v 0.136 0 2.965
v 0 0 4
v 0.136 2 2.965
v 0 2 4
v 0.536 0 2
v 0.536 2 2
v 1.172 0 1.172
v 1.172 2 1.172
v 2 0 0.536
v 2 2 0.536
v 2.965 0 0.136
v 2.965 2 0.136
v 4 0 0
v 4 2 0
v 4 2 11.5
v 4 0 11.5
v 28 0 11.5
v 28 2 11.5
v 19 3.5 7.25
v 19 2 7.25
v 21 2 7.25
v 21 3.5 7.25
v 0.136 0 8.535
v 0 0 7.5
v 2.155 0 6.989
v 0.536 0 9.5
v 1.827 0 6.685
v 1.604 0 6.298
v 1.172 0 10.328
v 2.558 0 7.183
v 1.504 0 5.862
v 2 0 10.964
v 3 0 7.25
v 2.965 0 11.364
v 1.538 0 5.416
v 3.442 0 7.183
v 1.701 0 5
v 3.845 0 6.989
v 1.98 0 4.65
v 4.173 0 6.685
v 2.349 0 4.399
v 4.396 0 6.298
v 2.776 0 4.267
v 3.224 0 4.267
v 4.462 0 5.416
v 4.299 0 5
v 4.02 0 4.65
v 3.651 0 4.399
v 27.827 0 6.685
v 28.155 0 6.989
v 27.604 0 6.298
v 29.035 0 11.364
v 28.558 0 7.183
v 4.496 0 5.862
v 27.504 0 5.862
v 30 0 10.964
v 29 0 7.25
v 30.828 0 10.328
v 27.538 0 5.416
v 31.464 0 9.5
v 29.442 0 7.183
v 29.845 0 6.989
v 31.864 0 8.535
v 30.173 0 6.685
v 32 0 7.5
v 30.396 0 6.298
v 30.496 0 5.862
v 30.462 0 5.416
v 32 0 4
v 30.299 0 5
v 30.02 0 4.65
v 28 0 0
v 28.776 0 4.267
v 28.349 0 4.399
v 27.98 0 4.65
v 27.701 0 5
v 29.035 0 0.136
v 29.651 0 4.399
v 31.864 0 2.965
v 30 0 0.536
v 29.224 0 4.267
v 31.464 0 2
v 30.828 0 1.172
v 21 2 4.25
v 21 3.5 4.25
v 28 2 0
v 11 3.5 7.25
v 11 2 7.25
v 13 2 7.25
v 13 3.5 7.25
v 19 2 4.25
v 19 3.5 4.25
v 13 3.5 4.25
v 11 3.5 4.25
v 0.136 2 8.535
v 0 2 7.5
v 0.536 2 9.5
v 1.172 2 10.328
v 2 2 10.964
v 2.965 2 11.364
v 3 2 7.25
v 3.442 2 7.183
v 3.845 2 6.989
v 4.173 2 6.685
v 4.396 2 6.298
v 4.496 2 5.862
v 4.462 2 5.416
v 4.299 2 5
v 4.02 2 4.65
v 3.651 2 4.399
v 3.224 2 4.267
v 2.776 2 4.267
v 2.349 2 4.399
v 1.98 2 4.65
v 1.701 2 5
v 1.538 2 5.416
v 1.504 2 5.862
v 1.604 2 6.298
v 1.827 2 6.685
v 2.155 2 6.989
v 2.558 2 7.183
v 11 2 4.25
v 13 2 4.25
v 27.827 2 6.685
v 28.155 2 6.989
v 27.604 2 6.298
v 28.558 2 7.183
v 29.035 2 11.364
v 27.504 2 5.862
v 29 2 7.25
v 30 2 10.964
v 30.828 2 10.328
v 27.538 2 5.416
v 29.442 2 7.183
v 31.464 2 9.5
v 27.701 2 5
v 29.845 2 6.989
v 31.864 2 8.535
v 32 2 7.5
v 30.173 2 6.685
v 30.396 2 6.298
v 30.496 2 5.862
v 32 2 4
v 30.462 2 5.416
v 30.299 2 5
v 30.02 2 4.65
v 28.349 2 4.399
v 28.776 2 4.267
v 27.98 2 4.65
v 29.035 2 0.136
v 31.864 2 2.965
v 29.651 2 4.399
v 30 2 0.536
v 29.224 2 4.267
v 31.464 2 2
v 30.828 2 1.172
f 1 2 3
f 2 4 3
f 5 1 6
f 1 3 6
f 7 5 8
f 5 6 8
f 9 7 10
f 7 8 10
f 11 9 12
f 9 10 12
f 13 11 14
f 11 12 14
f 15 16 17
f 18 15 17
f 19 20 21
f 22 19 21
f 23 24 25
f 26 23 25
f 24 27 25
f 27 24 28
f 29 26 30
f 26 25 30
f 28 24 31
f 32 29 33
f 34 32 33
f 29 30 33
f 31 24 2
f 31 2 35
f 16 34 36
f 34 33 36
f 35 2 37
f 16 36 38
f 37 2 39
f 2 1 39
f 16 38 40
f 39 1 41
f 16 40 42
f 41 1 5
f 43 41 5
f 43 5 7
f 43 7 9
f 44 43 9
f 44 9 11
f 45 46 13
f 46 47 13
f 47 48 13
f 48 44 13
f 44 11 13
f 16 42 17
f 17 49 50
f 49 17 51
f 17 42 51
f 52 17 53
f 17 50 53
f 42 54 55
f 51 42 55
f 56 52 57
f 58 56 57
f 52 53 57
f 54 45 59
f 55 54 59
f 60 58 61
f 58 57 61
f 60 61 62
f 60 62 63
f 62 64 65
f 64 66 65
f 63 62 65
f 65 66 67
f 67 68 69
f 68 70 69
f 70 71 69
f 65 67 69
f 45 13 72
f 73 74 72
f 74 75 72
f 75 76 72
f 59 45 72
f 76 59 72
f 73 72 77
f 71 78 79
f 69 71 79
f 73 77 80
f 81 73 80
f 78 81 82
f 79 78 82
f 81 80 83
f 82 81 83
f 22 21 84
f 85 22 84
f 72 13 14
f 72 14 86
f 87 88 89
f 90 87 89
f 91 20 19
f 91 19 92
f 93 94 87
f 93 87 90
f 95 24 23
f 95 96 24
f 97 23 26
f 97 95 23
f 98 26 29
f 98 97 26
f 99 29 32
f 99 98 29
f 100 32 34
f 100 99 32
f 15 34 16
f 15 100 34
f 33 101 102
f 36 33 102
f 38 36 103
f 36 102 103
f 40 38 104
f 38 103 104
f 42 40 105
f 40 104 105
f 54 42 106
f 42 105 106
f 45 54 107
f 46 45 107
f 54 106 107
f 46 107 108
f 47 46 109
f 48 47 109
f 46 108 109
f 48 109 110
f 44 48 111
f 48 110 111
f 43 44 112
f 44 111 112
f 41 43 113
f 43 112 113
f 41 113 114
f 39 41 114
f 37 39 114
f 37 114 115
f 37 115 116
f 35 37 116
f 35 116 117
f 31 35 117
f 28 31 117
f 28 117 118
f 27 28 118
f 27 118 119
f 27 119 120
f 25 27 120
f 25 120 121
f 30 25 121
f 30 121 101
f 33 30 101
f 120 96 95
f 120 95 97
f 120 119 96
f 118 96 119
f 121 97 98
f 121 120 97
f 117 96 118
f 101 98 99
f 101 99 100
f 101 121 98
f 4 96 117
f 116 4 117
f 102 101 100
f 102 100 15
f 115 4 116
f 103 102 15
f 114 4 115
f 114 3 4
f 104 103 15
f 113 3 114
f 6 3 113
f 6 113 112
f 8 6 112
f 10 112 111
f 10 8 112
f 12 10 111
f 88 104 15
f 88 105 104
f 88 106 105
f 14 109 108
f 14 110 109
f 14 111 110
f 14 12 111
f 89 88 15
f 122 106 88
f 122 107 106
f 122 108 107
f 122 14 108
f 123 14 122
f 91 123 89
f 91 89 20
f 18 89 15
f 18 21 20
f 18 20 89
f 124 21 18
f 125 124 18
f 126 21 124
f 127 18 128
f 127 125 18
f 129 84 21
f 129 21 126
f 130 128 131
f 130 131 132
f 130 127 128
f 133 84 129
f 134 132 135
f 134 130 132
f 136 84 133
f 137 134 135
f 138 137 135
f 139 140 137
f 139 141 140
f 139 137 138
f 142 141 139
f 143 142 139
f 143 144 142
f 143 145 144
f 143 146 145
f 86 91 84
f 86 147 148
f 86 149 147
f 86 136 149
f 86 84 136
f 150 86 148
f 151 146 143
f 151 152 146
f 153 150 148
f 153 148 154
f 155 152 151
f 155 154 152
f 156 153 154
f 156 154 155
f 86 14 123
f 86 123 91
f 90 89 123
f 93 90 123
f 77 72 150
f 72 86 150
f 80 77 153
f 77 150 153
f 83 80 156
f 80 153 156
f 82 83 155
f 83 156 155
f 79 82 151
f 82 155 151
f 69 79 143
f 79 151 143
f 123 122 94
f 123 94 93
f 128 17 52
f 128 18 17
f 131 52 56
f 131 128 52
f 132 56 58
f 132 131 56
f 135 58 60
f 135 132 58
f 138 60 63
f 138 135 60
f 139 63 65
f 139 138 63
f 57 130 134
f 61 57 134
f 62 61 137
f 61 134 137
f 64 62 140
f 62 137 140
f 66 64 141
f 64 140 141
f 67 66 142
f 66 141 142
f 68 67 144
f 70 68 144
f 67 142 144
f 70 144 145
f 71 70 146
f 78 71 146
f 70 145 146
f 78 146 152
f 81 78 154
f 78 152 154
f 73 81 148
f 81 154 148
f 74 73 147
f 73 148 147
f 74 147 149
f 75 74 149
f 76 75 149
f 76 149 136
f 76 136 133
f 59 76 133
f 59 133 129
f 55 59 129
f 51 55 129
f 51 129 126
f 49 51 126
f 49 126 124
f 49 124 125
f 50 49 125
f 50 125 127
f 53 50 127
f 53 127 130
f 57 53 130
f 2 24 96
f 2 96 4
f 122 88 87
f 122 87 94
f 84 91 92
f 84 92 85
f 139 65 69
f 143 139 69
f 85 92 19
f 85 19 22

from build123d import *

# Parameters (mm, degrees)
SKETCH1_W           = 32
SKETCH1_H           = 11.5
BOSS_EXTRUDE1_DEPTH = 2
SKETCH2_R           = 1.5
CUT_EXTRUDE1_DEPTH  = 35.062442661
FILLET1_R           = 4
SKETCH3_W           = 2
SKETCH3_H           = 3
BOSS_EXTRUDE2_DEPTH = 1.5


with BuildPart() as part:
    # Sketch1 → Boss-Extrude1 (new body)
    with BuildSketch(Plane(origin=(0, 0, 0), x_dir=(1, 0, 0), z_dir=(0, 1, 0))):
        with Locations((16, -5.75)):
            Rectangle(SKETCH1_W, SKETCH1_H)
    extrude(amount=BOSS_EXTRUDE1_DEPTH)

    # Sketch2 → Cut-Extrude1 (cut, through all)
    with BuildSketch(Plane(origin=(0, 2, 0), x_dir=(1, 0, 0), z_dir=(0, 1, 0))):
        with Locations(Location((3, -5.75, 0), (0, 0, 270))):
            Circle(SKETCH2_R)
        with Locations(Location((29, -5.75, 0), (0, 0, 270))):
            Circle(SKETCH2_R)
    extrude(amount=-CUT_EXTRUDE1_DEPTH, mode=Mode.SUBTRACT)

    # Fillet1
    fillet1_edges = [part.edges().sort_by_distance(p)[0] for p in [
        (0, 1, 0),
        (32, 1, 0),
        (32, 1, 11.5),
        (0, 1, 11.5),
    ]]
    fillet(fillet1_edges, radius=FILLET1_R)

    # Sketch3 → Boss-Extrude2 (add)
    with BuildSketch(Plane(origin=(0, 2, 0), x_dir=(1, 0, 0), z_dir=(0, 1, 0))):
        with Locations((12, -5.75)):
            Rectangle(SKETCH3_W, SKETCH3_H)
        with Locations((20, -5.75)):
            Rectangle(SKETCH3_W, SKETCH3_H)
    extrude(amount=BOSS_EXTRUDE2_DEPTH)


solid = part.part
